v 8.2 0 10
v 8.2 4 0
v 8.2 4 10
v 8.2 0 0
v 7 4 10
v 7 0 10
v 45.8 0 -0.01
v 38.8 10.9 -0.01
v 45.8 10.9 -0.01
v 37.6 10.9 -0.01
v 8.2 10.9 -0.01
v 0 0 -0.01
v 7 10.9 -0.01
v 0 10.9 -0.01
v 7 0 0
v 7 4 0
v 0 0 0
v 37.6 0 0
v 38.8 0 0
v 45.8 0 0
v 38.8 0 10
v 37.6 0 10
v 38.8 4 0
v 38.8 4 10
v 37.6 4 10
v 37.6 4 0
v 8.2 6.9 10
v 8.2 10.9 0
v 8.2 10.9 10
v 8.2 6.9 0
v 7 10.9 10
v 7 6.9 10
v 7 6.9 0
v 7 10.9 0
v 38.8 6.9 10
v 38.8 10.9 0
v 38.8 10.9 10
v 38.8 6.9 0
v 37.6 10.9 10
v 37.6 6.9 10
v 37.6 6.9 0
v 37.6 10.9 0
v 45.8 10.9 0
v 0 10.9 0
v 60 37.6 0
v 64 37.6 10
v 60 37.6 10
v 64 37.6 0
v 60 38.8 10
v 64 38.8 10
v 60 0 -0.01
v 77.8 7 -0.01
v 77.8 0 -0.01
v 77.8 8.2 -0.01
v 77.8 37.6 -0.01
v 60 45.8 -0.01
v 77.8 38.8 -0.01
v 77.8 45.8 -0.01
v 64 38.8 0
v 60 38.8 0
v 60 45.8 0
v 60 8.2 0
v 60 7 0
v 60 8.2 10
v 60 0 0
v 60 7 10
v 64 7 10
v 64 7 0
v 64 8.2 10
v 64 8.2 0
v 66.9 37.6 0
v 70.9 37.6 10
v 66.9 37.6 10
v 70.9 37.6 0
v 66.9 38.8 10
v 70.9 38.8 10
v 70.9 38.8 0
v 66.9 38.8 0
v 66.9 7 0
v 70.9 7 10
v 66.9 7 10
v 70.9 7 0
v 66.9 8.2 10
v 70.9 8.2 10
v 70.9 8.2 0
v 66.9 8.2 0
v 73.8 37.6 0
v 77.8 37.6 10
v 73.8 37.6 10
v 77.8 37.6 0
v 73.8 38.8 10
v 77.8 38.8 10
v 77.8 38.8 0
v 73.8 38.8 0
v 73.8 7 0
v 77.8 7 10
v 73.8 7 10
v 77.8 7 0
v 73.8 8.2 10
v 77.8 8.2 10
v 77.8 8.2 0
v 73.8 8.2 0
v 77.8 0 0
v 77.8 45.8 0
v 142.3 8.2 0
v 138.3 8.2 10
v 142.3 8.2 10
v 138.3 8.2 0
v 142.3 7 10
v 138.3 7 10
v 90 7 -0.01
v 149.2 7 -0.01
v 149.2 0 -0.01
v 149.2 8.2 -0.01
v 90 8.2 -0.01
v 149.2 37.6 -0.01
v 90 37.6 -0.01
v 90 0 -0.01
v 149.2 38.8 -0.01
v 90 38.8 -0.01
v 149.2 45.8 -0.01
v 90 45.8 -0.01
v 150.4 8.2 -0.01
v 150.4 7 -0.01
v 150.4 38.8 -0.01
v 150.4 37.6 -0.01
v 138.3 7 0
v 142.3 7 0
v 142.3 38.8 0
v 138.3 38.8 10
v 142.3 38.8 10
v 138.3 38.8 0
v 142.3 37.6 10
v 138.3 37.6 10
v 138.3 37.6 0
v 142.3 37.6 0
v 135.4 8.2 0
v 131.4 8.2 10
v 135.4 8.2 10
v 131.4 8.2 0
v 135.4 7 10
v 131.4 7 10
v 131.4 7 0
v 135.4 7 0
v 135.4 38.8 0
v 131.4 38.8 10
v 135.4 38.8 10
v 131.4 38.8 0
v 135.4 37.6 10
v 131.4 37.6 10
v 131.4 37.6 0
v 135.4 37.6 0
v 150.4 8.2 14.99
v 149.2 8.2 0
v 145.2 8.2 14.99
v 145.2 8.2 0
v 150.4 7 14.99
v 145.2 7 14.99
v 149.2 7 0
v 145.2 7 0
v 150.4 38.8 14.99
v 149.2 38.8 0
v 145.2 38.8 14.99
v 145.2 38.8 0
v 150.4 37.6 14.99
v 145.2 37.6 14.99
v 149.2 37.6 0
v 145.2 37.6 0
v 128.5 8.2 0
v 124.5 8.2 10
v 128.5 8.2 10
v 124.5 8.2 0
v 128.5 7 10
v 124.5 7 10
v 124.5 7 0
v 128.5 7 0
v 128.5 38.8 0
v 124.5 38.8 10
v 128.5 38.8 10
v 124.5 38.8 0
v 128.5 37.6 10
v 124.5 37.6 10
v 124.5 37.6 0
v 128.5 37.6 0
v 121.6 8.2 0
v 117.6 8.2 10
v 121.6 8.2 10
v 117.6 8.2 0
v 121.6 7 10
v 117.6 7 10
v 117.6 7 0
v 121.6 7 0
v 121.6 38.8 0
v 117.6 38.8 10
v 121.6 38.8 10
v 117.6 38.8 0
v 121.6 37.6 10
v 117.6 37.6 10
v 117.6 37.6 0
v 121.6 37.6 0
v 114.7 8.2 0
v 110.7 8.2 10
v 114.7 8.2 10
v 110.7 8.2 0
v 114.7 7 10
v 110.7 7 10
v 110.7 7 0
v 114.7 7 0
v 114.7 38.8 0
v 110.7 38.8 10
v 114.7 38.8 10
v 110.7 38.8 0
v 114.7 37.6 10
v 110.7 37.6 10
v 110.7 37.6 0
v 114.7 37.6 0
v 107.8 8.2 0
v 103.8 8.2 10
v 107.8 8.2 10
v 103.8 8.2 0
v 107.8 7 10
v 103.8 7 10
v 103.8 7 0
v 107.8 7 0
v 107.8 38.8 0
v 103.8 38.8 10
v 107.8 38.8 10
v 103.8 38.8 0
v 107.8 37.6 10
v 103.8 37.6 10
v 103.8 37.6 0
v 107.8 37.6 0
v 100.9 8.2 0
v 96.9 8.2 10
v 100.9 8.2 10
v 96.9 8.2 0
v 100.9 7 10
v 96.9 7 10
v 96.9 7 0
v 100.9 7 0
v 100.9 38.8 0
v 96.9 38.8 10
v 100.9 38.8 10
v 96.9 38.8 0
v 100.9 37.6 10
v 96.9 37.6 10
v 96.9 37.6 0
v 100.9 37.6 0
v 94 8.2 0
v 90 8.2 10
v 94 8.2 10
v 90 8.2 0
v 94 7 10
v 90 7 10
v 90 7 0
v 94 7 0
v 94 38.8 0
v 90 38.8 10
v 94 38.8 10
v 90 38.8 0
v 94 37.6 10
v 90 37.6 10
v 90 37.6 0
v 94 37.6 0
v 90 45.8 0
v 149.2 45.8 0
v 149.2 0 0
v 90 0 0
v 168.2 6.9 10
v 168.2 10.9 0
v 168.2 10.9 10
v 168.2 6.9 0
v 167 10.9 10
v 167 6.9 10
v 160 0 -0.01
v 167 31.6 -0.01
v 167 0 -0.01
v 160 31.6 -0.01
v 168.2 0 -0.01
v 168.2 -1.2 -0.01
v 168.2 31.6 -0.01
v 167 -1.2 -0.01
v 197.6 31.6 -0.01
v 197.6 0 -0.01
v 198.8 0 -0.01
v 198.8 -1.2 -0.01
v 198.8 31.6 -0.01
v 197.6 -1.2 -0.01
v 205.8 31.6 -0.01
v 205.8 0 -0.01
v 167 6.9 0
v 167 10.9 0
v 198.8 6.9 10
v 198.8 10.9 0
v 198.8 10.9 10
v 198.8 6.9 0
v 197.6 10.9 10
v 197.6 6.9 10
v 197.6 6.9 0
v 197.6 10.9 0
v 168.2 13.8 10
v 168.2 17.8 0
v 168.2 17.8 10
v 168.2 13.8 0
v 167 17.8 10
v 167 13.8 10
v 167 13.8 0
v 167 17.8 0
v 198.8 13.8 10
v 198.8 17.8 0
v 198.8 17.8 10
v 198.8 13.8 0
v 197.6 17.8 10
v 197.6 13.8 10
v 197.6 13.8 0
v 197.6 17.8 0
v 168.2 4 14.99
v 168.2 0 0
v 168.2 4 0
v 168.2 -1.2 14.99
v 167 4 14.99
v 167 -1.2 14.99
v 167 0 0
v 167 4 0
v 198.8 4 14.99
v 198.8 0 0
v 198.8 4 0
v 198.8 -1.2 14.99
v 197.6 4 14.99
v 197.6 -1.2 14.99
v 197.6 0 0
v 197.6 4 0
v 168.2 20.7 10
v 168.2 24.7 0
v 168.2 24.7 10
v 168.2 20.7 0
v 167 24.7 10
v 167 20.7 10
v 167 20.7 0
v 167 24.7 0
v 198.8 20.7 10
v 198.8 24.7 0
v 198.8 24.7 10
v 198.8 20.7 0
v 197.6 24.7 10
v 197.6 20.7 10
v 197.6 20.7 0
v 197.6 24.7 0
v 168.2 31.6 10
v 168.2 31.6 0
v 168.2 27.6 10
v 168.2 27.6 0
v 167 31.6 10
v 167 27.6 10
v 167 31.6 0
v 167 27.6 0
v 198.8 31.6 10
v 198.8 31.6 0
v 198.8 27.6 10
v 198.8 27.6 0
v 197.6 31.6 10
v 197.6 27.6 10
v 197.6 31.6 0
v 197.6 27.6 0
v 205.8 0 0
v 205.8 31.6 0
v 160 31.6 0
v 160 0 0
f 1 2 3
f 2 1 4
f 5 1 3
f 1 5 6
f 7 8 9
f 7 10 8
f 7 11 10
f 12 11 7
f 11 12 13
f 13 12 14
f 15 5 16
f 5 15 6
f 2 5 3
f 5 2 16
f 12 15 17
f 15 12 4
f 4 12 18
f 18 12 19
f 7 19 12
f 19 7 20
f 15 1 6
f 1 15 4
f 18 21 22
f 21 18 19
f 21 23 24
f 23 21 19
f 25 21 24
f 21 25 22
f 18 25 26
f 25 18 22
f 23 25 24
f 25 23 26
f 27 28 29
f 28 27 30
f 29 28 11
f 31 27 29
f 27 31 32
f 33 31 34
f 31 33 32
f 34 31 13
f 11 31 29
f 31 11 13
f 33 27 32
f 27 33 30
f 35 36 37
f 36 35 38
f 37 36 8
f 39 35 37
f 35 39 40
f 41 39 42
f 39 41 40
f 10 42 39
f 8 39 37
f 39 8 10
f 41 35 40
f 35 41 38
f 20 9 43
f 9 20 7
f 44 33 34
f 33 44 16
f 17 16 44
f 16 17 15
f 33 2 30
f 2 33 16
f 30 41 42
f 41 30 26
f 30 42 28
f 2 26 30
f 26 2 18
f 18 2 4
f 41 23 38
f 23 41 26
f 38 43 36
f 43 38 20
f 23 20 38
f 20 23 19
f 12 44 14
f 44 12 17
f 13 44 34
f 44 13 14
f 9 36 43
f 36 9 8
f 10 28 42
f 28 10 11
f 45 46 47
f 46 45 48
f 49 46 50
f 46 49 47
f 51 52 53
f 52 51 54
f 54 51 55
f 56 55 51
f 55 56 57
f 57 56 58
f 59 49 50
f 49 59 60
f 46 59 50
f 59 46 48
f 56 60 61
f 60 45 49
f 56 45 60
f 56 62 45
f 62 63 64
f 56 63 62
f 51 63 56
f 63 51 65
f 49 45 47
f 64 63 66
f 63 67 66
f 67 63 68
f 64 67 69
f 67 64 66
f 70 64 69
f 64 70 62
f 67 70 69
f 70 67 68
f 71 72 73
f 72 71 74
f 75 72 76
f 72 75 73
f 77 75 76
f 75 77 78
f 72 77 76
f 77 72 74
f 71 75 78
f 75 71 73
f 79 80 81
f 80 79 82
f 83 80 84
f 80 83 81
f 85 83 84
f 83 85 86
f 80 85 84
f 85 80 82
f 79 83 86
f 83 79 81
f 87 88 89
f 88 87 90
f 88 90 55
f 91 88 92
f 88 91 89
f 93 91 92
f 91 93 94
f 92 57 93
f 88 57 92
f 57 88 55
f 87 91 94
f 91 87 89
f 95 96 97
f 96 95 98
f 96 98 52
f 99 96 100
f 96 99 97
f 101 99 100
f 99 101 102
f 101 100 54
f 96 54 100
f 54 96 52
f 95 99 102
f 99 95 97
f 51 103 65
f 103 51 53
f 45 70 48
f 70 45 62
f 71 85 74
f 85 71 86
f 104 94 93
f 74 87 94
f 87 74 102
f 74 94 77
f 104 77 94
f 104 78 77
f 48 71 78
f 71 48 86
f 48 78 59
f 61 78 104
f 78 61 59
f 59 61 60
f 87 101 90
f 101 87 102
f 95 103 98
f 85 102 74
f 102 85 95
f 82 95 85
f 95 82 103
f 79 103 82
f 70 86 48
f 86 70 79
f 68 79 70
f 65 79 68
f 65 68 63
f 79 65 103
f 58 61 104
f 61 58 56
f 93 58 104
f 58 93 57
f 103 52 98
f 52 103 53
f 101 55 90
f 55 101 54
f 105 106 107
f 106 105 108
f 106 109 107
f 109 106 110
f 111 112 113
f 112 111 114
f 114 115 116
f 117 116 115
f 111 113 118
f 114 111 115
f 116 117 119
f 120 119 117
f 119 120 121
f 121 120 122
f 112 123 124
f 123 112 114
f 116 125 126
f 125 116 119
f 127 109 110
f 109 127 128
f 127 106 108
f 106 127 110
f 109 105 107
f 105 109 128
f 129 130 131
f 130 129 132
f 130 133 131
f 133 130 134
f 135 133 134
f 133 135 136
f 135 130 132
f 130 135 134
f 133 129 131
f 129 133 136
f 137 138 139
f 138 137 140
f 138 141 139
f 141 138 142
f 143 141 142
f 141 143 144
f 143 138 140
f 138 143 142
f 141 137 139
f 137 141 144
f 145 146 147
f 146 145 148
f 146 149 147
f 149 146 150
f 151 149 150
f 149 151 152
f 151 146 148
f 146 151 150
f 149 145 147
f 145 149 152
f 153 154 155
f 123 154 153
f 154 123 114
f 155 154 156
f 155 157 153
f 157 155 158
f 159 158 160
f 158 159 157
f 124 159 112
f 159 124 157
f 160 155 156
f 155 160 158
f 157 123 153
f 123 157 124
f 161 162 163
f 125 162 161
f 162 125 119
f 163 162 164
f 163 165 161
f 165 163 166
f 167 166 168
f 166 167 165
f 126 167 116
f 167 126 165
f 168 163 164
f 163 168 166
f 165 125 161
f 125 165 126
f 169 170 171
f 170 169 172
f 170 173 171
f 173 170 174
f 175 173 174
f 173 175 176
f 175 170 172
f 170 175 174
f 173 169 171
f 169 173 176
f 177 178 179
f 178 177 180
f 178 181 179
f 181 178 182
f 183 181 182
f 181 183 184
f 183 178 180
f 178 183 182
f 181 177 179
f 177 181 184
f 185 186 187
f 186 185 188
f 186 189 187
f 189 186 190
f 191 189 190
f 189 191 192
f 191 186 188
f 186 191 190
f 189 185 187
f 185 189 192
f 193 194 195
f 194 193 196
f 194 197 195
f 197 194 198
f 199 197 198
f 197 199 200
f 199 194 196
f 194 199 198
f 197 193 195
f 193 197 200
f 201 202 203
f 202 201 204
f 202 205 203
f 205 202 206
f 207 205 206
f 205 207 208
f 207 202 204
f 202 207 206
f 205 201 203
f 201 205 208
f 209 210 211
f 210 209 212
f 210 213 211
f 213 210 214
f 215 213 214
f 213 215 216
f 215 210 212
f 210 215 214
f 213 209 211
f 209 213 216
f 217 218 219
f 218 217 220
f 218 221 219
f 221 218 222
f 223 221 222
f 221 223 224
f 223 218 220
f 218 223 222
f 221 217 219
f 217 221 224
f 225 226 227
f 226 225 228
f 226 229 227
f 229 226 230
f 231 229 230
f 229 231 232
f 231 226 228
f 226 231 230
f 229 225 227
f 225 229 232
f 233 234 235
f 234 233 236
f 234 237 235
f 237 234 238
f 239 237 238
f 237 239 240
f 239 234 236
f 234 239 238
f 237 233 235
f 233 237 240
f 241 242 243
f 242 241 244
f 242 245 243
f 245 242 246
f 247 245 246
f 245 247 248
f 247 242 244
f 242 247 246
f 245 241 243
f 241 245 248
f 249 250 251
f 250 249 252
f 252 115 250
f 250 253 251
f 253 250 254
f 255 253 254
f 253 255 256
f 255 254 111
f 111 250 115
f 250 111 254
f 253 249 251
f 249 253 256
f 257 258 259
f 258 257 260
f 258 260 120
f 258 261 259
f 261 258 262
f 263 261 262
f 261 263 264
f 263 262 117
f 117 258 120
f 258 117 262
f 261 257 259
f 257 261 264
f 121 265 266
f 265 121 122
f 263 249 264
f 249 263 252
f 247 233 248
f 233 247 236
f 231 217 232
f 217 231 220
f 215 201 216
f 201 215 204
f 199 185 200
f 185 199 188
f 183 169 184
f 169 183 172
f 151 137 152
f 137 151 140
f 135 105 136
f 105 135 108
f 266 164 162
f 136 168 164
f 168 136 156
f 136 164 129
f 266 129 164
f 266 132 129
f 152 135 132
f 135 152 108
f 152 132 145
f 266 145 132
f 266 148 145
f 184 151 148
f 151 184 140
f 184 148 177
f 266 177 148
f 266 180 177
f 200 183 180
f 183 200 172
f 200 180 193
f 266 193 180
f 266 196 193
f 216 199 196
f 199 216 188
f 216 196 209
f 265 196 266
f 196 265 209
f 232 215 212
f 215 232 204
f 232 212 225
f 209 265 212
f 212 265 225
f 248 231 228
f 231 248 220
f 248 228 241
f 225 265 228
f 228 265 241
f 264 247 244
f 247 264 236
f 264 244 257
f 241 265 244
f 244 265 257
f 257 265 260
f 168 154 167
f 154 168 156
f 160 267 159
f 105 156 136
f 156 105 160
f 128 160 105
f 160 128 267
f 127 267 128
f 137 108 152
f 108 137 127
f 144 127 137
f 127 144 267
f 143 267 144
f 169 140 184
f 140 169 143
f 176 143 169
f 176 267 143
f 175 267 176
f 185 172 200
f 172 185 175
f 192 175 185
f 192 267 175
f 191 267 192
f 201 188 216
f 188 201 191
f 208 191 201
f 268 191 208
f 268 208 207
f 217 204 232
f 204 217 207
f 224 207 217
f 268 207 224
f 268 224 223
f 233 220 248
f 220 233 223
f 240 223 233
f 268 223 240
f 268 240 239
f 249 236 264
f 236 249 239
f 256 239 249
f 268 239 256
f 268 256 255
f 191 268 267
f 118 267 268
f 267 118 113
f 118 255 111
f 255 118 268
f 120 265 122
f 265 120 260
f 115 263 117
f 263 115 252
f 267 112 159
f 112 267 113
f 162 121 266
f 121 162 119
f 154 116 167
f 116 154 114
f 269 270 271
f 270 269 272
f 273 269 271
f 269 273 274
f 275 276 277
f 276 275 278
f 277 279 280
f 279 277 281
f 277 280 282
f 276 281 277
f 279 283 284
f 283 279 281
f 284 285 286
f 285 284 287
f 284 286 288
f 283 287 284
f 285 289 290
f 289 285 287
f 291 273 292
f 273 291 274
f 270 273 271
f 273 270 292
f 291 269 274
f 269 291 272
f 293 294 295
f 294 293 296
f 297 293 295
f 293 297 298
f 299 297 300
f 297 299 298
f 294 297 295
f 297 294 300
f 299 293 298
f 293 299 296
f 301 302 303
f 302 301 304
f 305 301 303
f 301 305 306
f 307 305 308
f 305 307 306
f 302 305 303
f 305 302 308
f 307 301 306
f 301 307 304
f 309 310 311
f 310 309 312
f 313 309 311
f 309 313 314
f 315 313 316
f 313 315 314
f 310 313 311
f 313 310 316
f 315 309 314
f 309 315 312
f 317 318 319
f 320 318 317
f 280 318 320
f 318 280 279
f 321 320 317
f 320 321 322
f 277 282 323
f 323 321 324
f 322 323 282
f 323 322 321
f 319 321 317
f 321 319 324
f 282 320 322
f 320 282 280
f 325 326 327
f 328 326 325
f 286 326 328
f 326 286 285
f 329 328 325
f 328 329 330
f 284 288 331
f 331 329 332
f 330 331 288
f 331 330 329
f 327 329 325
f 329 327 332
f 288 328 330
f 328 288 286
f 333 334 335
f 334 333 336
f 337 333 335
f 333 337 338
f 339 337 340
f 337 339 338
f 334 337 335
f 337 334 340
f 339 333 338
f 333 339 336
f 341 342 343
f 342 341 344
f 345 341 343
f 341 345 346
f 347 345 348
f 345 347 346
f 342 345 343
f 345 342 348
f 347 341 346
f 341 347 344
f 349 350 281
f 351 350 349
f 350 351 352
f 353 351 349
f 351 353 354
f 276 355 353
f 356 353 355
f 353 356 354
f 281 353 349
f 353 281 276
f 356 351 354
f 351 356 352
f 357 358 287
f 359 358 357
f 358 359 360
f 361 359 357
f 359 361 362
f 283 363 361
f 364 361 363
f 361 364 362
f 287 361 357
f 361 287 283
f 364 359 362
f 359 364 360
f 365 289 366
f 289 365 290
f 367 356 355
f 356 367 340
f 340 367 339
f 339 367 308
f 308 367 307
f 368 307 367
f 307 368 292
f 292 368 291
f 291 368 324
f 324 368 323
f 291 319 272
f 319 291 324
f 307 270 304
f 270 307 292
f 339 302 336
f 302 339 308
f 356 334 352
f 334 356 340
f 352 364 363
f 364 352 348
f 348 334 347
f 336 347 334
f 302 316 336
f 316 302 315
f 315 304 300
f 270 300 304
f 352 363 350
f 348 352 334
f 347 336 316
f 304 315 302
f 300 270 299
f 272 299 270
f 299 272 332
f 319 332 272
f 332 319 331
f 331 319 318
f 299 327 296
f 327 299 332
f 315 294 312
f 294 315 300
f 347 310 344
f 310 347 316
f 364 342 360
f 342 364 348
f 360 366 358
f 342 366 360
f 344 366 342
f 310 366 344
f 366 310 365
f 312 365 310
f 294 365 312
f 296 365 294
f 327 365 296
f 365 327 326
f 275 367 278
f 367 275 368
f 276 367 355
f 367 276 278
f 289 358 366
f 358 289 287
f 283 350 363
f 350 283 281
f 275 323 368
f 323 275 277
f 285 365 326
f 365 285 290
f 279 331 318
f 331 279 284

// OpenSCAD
// file: ../../Base/Boxes.scad
// Fischertechnik Box Foundation
// Pre-designed Boxes

use <Constants.scad>

include <PlacementOptions.scad>

box190Width = 190;
box190Depth = 130;
box130Width = 130;
box130Depth = 95;
boxUsageHeight = 33.9;
boxWallThickness = 2.4;
boxBaseThickness = 1.0;

// getBoxWallThickness()
// Gets the wall thickness of a Fischertechnik Box

function getBoxWallThickness() = boxWallThickness;

// Gets the usable height of a fischertechnik box
function getBoxUsageHeight() = boxUsageHeight;

// Gets the thickness of the Fischertechnik box base.
function getBoxBaseThickness() = boxBaseThickness;

// Gets the usable inner space of a Box 190 as an x/y-list
function getBox190Space() = [
    box190Width - 2*getBoxWallThickness(), 
    box190Depth - 2*getBoxWallThickness() ];

// Imports the Fischertechnik empty box 130x190 mm and places it at position 0,0
// 190x130 are the outer sizes, the inner space is slightly smaller. Use getBox190Space() to get the inner sizes.
// This module needs the STL file "Fischertechnik Box 130x190.stl" in the library path.
// The box is positioned that the usable inner space is at the 0,0,0 position. The

module Box190() {
    translate([-getBoxWallThickness(),-getBoxWallThickness(),-getBoxBaseThickness()])
        import("Fischertechnik Box 130x190.stl", convexity=3);
}

// Gets the usable inner space of a Box 130 as an x/y-list
function getBox130Space() = [
    box130Width - 2*getBoxWallThickness(), 
    box130Depth - 2*getBoxWallThickness() ];

// Imports the Fischertechnik empty box 95x130 mm and places it at position 0,0
// 190x130 are the outer sizes, the inner space is slightly smaller. Use getBox190Space() to get the inner sizes.
// This module needs the STL file "Fischertechnik Box 95x130.stl" in the library path.
// The box is positioned that the usable inner space is at the 0,0,0 position. The

module Box130() {
    translate([-getBoxWallThickness(),-getBoxWallThickness(),-getBoxBaseThickness()])
        import("Fischertechnik Box 95x130.stl", convexity=3);
}

// Creates a web at the specified box walls
// corner 0 = LowerLeft, 1 = UpperLeft, 2 = UpperRight, 3 = LowerRight
// side 0 = LeftOfCorner, 1 = RightOfCorner
// distance = Distance in mm from the corner
// box = inner width and depth of the box (default: Box 190)
// webWidth = length of the web (default is 3 mms)
// webThickness = thickness of the web (default is 1 mm)

module BoxWeb(corner, side, distance, box=getBox190Space(), webWidth=3, webThickness=1.0) {
    sink = getBoxWallThickness()/2;

    width = (corner % 2 == 0) ? 
            (side == LeftOfCorner ? webWidth : webThickness) :
            (side == LeftOfCorner ? webThickness : webWidth);

    depth = (corner % 2 == 0) ? 
            (side == RightOfCorner ? webWidth : webThickness) :
            (side == RightOfCorner ? webThickness : webWidth);
    
    xDiff = corner == LowerLeft ? 
                (side == LeftOfCorner ? -sink : distance) :
            (corner == UpperLeft ?                
                (side == LeftOfCorner ? distance : -sink) :
            (corner == UpperRight ?
                (side == LeftOfCorner ? box.x-webWidth+sink : box.x-distance-webThickness) :
                (side == LeftOfCorner ? box.x-distance-webThickness: box.x-webWidth+sink)));

    yDiff = corner == LowerLeft ? 
                (side == RightOfCorner ? -sink : distance) :
            (corner == UpperLeft ?
                (side == RightOfCorner ? box.y-distance : box.y-webWidth+sink) :
            (corner == UpperRight ?
                (side == RightOfCorner ? box.y-webWidth+sink : box.y-distance) :
                (side == RightOfCorner ? distance : -sink)));
    
    translate([xDiff, yDiff, -getExcess()])
        cube([width, depth, boxUsageHeight + 2*getExcess()]);
}
// file: ../../Base/Rotation.scad
// Fischertechnik Box Foundation
// Geometry Helpers Rotation

include <PlacementOptions.scad>

// getRotatedSpace(space, rotation=NoRotation)
// Rotates the space dependent on the specified rotation

function getRotatedSpace(space, rotation=NoRotation) = [
    (rotation == Rotate90 || rotation == Rotate270) ? space.y : space.x,
    (rotation == Rotate90 || rotation == Rotate270) ? space.x : space.y
];

// Rotates the given space around the fixed left lower corner
// space = the space the children needs as width/depth list [width,depth]
// rotation = 0 Rotate0 degrees, 1 Rotate90 degrees, 2 Rotate180 degrees, 3 Rotate270 degrees (equivalent to -90)

module RotateFix(space, rotation=Rotate0) {
    dy = (rotation == Rotate0 || rotation == Rotate270) ? 0 :
        (rotation == Rotate90) ? space.x :
        space.y;
    dx = (rotation < Rotate180) ? 0 :
        (rotation == Rotate180) ? space.x :
        space.y;
    
    translate([dx, dy, 0])
        rotate([0, 0, rotations[rotation]])
            children();
}
// file: ../../Base/Alignment.scad
// Fischertechnik Box Foundation
// Geometry Helpers Alignment

include <PlacementOptions.scad>

// getAlignedX(elementWidth, spaceWidth, align=AlignRight, offset=0)
// Gets the aligned X offset of an element with the given
// width in the given space.
// elementWidth = The width of the element to positon
// spaceWidth = The space where the element should be aligned
// align = 0 AlignLeft, 1 AlignCenter, 2 AlignRight
// offset = an optional offset from the aligned position. When
// aligned left or centered, then positive values are in X direction.
// When aligned right then positive values are in negative X direction.

function getAlignedX(elementWidth, spaceWidth, align=AlignRight, offset=0) =
    (align == AlignLeft) ?
        offset :
        ((align == AlignCenter) ?
        (spaceWidth - elementWidth)/2 + offset :
        spaceWidth - offset - elementWidth);

// getAlignedY(elementDepth, spaceDepth, align=AlignTop, offset=0)
// Gets the aligned Y offset of an element with the given
// depth in the given space.
// elementDepth = The depth of the element to positon
// spaceDepth = The space where the element should be aligned
// align = 0 AlignBottom, 1 AlignCenter, 2 AlignTop
// offset = an optional offset from the aligned position. When
// aligned bottom or centered, then positive values are in Y direction.
// When aligned top then positive values are in negative Y direction.

function getAlignedY(elementDepth, spaceDepth, align=AlignTop, offset=0) =
    (align == AlignBottom) ?
        offset :
        ((align == AlignCenter) ?
        (spaceDepth - elementDepth)/2 + offset :
        spaceDepth - offset - elementDepth);
// file: ../../Base/Constants.scad
// Fischertechnik Box Foundation
// Constants

// Constant values necessary for multiple elements

// Base constants
dividerThickness = 1.2;
excess = 0.01;
fragments = 90;
tolerance = 0.8;

// Gets the thickness of a divider 
function getDividerThickness() = dividerThickness;

// Gets the excess that is used to merge walls into each other
function getExcess() = excess;

// Gets amount of fragments of a cylinder
function getFragments() = fragments;

// Gets the inner tolerance of a frame to each side
function getTolerance() = tolerance;


// Fischertechnik specific constants
axisDiameter = 4;
axisBottomDiameter = axisDiameter + 1;
standardEdgeDistance = 2.5;
standardWebDistance = 11.5;
standardCornerLength = 15;
tubeWallFactor = 1.6;

// Gets axis diameter
function getAxisDiameter() = axisDiameter;

// Gets axis bottom diameter for thicker part at the bottom
function getAxisBottomDiameter() = axisBottomDiameter;

// gets the standard distance to the wall of the box for dockable frames with webs
function getStandardEdgeDistance() = standardEdgeDistance;

// gets the standard distance of each web to the corner of the dockable frame
function getStandardWebDistance() = standardWebDistance;

// gets the standard length of the corner walls of a dockable frame
function getStandardCornerLength() = standardCornerLength;

// gets the wall thickness of a tube.
function getTubeWallThickness() = tubeWallFactor * getDividerThickness();
// file: ../../Base/PlacementOptions.scad
// Fischertechnik Box Foundation
// Placement Options

// Alignment
NoAlign = 0;
AlignLeft = 1;
AlignBottom = 2;
AlignCenter = 3;
AlignRight = 4;
AlignTop = 5;

// Element rotation degree steps
rotations = [0, -90, -180, -270];

// Rotation
NoRotation = 0;
Rotate0 = 0;
Rotate90 = 1;
Rotate180 = 2;
Rotate270 = 3;

// Docking (seen from above)
NoDock = -1;
DockLeft = 0;
DockTop = 1;
DockRight = 2;
DockCorner = 2;
DockBottom = 3;

// Web corners
LowerLeft = 0;
UpperLeft = 1;
UpperRight = 2;
LowerRight = 3;

// Web position relative to corner
LeftOfCorner = 0;
RightOfCorner = 1;
// file: ../../Elements/HolderBuildingPlate45x30.scad
// Fischertechnik Box Library
// Holder for Building Plate 45x30
// 38259

use <../ModelBase/Complex.scad>

width = 45;

// getHolderBuildingPlate45x30Space(count = 1)
// Gets the width (.x) and depth (.y) space the holder needs.

function getHolderBuildingPlate45x30Space(count = 1) = getHolderBuildingPlateSpace(width, count);

// HolderBuildingPlate45x30(count=1, dock=false)
// Holder for building plates 45x30
// count = Count of building plates (default 1)
// dock = true if the holders are docked to the box wall (default false) 

module HolderBuildingPlate45x30(count = 1, dock = false) {
    HolderBuildingPlate(width, count, firstGapHigher = dock);
}

// Test
color("lightgray")
HolderBuildingPlate45x30(2);
// file: ../../Base/Placement.scad
// Fischertechnik Box Foundation
// Geometry Helpers Placement

use <Constants.scad>
use <Alignment.scad>
use <Rotation.scad>
use <Boxes.scad>

include <PlacementOptions.scad>

// Place(x=0, y=0, elementSpace=[0,0], alignX=AlignLeft, alignY=AlignBottom, rotation=Rotate0, boxSpace=getBox190Space())
// Places the child at the specified position
// y = Y-Position. This is a relative position when an X aligment is specified.
// x = X-Position. This is a relative position when an Y aligment is specified.
// elementSpace = space of the element to be placed [x,y]
// alignX = -1=NoAlign, 0 AlignLeft, 1 AlignCenter, 3 AlignRight (elementSpace and boxSpace required!)
// alignY = -1=NoAlign, 2 AlignBottom, 1 AlignCenter, 4 AlignTop (elementSpace and boxSpace required!)
// rotation = 0 Rotate0 0 degrees, 1 Rotate90 90 degrees, 
// 2 Rotate180 180 degrees, 3 Rotate270 270 degrees (equivalent to -90)
// boxSpace = Inner space of the box where the placement occurs [x,y] - default is Box 190x130 inner space

module Place(x=0, y=0, elementSpace=[0,0], 
  alignX=AlignLeft, alignY=AlignBottom, 
  rotation=NoRotation, boxSpace=getBox190Space()) {

    module Position(x, y, space, rotation=Rotate0) {
        translate([x, y, 0])
            RotateFix(space, rotation)
                children(0);
    }

    space = getRotatedSpace(elementSpace, rotation);
    alignedX = getAlignedX(space.x, boxSpace.x, alignX, x);
    alignedY = getAlignedY(space.y, boxSpace.y, alignY, y);
    Position(alignedX, alignedY, elementSpace, rotation)
        children(0);
}

// Center(space=getBox130Space(), elementSpace=[0,0])
// space = Space where the children is centered. For cylinder use centered=true and no elementSpace.
// elementSpace = space of the element to be centered [x,y]

module Center(space=getBox190Space(), elementSpace=[0,0]) {
    translate([(space.x - elementSpace.x) / 2, (space.y - elementSpace.y) / 2])
        children(0);
}

// CenterHorizontal(width=0, y=0, offset=0, space=getBox130Space())
// space = Space where the children is centered. For cylinder use centered=true and no elementSpace.
// elementSpace = space of the element to be centered [x,y]

module CenterHorizontal(width=0, y=0, offset=0, space=getBox190Space()) {
    translate([(space.x - width) / 2 + offset, y])
        children(0);
}

// CenterVertical(depth=0, x=0, offset=0, space=getBox130Space())
// space = Space where the children is centered. For cylinder use centered=true and no elementSpace.
// elementSpace = space of the element to be centered [x,y]

module CenterVerticalal(depth=0, x=0, offset=0, space=getBox190Space()) {
    translate([x, (space.y - depth) / 2 + offset])
        children(0);
}
// main file
// Fischertechnik Box Foundation
// Elements
// Test HolderBuildingPlate45x30

use <../../Base/Placement.scad>
use <../../Elements/HolderBuildingPlate45x30.scad>

include <../../Base/PlacementOptions.scad>

HolderBuildingPlate45x30();

Place(60, 0, elementSpace=getHolderBuildingPlate45x30Space(2), rotation=Rotate90)
    HolderBuildingPlate45x30(2);

Place(90, 0, elementSpace=getHolderBuildingPlate45x30Space(8), rotation=Rotate270)
    HolderBuildingPlate45x30(8, true);

Place(160, 0)
    HolderBuildingPlate45x30(4, true);
